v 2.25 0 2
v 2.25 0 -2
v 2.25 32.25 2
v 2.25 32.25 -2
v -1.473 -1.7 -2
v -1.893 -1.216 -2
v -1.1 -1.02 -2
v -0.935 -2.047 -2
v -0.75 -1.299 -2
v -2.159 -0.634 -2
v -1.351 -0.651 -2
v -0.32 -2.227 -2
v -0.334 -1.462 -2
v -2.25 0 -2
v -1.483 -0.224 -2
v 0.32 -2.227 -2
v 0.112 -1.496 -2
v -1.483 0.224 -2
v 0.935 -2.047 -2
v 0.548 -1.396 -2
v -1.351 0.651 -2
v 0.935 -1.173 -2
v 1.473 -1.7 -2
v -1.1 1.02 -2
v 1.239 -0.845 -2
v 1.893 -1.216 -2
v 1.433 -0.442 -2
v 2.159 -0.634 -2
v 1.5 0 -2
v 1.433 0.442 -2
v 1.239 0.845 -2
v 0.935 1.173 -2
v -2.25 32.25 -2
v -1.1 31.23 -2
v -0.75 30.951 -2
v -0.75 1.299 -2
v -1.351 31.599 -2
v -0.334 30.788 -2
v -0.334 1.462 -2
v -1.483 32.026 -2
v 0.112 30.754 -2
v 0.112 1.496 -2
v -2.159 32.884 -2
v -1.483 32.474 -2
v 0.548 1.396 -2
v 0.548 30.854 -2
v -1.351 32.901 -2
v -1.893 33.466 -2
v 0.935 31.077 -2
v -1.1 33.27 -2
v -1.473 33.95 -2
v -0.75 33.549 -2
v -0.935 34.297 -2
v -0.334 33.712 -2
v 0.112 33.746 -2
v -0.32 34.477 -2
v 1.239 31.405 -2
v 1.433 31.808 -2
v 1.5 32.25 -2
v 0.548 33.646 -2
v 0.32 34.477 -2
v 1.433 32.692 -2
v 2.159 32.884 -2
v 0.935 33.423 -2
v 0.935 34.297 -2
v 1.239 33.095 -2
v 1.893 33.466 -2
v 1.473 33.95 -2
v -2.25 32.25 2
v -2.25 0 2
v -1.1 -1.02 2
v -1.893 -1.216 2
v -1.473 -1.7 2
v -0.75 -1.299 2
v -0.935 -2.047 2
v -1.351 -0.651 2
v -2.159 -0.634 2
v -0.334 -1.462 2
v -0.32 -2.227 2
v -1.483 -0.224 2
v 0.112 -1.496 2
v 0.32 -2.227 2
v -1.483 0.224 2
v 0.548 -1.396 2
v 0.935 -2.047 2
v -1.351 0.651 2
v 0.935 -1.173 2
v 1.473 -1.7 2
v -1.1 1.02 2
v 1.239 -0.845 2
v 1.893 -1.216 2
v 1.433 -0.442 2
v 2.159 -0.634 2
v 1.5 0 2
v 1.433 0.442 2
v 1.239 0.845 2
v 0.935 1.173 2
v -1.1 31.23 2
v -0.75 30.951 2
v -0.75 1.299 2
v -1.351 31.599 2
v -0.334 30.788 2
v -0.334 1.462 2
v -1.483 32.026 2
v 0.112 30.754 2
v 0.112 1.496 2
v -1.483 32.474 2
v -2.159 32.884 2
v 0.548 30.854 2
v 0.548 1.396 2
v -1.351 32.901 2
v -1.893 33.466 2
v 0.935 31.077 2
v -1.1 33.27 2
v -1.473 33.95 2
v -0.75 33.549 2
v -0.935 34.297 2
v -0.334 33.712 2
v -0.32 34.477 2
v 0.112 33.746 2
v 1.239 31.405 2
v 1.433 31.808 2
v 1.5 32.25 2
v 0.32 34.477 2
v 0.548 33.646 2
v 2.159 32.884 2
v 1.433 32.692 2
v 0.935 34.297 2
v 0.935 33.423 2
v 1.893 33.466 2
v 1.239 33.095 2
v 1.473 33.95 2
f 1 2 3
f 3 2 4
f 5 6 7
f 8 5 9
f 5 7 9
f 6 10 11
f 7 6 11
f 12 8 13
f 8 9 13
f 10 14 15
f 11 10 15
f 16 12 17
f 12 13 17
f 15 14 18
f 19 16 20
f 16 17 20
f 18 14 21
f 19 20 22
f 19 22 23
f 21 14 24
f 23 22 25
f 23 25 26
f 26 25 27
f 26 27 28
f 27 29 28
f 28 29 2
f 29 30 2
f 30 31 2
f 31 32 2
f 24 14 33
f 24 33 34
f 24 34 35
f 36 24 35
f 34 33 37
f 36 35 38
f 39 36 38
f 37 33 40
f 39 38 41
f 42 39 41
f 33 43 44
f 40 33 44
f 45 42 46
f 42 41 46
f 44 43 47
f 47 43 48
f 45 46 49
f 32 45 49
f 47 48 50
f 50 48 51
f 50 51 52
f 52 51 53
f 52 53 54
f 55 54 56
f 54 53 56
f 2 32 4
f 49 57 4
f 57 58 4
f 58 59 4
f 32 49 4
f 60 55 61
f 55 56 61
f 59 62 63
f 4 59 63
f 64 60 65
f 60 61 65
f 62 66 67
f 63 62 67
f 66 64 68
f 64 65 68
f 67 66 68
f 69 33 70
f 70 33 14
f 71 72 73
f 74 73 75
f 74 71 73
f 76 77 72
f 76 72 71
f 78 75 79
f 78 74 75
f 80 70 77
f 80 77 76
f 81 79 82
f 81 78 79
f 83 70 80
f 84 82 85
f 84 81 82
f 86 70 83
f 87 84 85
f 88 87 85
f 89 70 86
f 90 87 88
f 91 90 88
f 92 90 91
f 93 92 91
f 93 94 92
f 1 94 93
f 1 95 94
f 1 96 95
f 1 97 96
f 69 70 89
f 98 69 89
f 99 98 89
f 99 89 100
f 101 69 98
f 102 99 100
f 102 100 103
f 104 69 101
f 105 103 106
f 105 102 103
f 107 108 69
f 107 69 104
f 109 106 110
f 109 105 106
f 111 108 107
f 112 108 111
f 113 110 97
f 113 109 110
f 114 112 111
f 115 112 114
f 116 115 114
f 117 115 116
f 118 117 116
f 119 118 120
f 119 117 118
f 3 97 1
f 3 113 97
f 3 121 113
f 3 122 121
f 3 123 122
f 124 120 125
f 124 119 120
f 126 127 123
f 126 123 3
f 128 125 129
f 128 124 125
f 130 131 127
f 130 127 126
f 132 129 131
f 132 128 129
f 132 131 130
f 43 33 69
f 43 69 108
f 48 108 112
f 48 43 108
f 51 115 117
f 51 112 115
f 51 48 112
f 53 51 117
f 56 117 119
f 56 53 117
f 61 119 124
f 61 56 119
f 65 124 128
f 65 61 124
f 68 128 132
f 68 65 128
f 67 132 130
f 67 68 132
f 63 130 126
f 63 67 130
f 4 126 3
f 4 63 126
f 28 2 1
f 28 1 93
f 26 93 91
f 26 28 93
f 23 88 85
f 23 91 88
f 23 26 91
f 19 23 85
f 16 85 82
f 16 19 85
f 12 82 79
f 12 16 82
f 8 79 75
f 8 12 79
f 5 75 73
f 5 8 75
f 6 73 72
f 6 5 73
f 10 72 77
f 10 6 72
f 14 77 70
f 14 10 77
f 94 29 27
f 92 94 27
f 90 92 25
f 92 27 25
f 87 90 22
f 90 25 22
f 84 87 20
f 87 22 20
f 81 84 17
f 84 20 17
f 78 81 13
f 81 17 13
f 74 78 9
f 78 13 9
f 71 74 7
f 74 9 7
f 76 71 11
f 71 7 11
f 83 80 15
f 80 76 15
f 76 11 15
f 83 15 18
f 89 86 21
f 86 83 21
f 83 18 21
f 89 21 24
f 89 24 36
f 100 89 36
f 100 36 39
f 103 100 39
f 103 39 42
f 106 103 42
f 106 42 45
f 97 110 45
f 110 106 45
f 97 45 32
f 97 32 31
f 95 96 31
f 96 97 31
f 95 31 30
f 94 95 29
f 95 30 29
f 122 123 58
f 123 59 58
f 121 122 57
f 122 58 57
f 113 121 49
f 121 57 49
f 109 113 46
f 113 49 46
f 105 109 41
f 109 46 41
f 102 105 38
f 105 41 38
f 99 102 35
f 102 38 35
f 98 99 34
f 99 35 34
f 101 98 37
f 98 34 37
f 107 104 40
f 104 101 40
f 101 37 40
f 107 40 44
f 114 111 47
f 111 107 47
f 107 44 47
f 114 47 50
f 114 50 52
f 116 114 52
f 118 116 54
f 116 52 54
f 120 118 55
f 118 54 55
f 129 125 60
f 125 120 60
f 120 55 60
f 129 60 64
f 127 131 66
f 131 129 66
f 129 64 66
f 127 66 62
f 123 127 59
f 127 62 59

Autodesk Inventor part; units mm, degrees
ref_plane "YZ Plane" through (0, 0, 0) normal (1, 0, 0) x (0, 1, 0)
ref_plane "XZ Plane" through (0, 0, 0) normal (0, 1, 0) x (-1, 0, 0)
ref_plane "XY Plane" through (0, 0, 0) normal (0, 0, 1) x (1, 0, 0)
sketch "Sketch1" plane through (0, 0, 0) normal (0, 0, 1) x (1, 0, 0)
  line L0 (0, 0) -> (0, 32.25) construction
  line L1 (2.25, 0) -> (2.25, 32.25)
  line L2 (-2.25, 32.25) -> (-2.25, 0)
  arc A0 (-2.25, 0) -> (2.25, 0) centre (0, 0) ccw
  arc A1 (2.25, 32.25) -> (-2.25, 32.25) centre (0, 32.25) ccw
  circle A2 centre (0, 0) radius 1.5
  circle A3 centre (0, 32.25) radius 1.5
  point P0 (0, 16.125)
  dimension "d0" = 32.25
  dimension "d1" = 4.5
  dimension "d2" = 3
  dimension "d3" = 3
extrude "Extrusion1" add sketch "Sketch1" along normal mid plane 4
properties part number "un"
